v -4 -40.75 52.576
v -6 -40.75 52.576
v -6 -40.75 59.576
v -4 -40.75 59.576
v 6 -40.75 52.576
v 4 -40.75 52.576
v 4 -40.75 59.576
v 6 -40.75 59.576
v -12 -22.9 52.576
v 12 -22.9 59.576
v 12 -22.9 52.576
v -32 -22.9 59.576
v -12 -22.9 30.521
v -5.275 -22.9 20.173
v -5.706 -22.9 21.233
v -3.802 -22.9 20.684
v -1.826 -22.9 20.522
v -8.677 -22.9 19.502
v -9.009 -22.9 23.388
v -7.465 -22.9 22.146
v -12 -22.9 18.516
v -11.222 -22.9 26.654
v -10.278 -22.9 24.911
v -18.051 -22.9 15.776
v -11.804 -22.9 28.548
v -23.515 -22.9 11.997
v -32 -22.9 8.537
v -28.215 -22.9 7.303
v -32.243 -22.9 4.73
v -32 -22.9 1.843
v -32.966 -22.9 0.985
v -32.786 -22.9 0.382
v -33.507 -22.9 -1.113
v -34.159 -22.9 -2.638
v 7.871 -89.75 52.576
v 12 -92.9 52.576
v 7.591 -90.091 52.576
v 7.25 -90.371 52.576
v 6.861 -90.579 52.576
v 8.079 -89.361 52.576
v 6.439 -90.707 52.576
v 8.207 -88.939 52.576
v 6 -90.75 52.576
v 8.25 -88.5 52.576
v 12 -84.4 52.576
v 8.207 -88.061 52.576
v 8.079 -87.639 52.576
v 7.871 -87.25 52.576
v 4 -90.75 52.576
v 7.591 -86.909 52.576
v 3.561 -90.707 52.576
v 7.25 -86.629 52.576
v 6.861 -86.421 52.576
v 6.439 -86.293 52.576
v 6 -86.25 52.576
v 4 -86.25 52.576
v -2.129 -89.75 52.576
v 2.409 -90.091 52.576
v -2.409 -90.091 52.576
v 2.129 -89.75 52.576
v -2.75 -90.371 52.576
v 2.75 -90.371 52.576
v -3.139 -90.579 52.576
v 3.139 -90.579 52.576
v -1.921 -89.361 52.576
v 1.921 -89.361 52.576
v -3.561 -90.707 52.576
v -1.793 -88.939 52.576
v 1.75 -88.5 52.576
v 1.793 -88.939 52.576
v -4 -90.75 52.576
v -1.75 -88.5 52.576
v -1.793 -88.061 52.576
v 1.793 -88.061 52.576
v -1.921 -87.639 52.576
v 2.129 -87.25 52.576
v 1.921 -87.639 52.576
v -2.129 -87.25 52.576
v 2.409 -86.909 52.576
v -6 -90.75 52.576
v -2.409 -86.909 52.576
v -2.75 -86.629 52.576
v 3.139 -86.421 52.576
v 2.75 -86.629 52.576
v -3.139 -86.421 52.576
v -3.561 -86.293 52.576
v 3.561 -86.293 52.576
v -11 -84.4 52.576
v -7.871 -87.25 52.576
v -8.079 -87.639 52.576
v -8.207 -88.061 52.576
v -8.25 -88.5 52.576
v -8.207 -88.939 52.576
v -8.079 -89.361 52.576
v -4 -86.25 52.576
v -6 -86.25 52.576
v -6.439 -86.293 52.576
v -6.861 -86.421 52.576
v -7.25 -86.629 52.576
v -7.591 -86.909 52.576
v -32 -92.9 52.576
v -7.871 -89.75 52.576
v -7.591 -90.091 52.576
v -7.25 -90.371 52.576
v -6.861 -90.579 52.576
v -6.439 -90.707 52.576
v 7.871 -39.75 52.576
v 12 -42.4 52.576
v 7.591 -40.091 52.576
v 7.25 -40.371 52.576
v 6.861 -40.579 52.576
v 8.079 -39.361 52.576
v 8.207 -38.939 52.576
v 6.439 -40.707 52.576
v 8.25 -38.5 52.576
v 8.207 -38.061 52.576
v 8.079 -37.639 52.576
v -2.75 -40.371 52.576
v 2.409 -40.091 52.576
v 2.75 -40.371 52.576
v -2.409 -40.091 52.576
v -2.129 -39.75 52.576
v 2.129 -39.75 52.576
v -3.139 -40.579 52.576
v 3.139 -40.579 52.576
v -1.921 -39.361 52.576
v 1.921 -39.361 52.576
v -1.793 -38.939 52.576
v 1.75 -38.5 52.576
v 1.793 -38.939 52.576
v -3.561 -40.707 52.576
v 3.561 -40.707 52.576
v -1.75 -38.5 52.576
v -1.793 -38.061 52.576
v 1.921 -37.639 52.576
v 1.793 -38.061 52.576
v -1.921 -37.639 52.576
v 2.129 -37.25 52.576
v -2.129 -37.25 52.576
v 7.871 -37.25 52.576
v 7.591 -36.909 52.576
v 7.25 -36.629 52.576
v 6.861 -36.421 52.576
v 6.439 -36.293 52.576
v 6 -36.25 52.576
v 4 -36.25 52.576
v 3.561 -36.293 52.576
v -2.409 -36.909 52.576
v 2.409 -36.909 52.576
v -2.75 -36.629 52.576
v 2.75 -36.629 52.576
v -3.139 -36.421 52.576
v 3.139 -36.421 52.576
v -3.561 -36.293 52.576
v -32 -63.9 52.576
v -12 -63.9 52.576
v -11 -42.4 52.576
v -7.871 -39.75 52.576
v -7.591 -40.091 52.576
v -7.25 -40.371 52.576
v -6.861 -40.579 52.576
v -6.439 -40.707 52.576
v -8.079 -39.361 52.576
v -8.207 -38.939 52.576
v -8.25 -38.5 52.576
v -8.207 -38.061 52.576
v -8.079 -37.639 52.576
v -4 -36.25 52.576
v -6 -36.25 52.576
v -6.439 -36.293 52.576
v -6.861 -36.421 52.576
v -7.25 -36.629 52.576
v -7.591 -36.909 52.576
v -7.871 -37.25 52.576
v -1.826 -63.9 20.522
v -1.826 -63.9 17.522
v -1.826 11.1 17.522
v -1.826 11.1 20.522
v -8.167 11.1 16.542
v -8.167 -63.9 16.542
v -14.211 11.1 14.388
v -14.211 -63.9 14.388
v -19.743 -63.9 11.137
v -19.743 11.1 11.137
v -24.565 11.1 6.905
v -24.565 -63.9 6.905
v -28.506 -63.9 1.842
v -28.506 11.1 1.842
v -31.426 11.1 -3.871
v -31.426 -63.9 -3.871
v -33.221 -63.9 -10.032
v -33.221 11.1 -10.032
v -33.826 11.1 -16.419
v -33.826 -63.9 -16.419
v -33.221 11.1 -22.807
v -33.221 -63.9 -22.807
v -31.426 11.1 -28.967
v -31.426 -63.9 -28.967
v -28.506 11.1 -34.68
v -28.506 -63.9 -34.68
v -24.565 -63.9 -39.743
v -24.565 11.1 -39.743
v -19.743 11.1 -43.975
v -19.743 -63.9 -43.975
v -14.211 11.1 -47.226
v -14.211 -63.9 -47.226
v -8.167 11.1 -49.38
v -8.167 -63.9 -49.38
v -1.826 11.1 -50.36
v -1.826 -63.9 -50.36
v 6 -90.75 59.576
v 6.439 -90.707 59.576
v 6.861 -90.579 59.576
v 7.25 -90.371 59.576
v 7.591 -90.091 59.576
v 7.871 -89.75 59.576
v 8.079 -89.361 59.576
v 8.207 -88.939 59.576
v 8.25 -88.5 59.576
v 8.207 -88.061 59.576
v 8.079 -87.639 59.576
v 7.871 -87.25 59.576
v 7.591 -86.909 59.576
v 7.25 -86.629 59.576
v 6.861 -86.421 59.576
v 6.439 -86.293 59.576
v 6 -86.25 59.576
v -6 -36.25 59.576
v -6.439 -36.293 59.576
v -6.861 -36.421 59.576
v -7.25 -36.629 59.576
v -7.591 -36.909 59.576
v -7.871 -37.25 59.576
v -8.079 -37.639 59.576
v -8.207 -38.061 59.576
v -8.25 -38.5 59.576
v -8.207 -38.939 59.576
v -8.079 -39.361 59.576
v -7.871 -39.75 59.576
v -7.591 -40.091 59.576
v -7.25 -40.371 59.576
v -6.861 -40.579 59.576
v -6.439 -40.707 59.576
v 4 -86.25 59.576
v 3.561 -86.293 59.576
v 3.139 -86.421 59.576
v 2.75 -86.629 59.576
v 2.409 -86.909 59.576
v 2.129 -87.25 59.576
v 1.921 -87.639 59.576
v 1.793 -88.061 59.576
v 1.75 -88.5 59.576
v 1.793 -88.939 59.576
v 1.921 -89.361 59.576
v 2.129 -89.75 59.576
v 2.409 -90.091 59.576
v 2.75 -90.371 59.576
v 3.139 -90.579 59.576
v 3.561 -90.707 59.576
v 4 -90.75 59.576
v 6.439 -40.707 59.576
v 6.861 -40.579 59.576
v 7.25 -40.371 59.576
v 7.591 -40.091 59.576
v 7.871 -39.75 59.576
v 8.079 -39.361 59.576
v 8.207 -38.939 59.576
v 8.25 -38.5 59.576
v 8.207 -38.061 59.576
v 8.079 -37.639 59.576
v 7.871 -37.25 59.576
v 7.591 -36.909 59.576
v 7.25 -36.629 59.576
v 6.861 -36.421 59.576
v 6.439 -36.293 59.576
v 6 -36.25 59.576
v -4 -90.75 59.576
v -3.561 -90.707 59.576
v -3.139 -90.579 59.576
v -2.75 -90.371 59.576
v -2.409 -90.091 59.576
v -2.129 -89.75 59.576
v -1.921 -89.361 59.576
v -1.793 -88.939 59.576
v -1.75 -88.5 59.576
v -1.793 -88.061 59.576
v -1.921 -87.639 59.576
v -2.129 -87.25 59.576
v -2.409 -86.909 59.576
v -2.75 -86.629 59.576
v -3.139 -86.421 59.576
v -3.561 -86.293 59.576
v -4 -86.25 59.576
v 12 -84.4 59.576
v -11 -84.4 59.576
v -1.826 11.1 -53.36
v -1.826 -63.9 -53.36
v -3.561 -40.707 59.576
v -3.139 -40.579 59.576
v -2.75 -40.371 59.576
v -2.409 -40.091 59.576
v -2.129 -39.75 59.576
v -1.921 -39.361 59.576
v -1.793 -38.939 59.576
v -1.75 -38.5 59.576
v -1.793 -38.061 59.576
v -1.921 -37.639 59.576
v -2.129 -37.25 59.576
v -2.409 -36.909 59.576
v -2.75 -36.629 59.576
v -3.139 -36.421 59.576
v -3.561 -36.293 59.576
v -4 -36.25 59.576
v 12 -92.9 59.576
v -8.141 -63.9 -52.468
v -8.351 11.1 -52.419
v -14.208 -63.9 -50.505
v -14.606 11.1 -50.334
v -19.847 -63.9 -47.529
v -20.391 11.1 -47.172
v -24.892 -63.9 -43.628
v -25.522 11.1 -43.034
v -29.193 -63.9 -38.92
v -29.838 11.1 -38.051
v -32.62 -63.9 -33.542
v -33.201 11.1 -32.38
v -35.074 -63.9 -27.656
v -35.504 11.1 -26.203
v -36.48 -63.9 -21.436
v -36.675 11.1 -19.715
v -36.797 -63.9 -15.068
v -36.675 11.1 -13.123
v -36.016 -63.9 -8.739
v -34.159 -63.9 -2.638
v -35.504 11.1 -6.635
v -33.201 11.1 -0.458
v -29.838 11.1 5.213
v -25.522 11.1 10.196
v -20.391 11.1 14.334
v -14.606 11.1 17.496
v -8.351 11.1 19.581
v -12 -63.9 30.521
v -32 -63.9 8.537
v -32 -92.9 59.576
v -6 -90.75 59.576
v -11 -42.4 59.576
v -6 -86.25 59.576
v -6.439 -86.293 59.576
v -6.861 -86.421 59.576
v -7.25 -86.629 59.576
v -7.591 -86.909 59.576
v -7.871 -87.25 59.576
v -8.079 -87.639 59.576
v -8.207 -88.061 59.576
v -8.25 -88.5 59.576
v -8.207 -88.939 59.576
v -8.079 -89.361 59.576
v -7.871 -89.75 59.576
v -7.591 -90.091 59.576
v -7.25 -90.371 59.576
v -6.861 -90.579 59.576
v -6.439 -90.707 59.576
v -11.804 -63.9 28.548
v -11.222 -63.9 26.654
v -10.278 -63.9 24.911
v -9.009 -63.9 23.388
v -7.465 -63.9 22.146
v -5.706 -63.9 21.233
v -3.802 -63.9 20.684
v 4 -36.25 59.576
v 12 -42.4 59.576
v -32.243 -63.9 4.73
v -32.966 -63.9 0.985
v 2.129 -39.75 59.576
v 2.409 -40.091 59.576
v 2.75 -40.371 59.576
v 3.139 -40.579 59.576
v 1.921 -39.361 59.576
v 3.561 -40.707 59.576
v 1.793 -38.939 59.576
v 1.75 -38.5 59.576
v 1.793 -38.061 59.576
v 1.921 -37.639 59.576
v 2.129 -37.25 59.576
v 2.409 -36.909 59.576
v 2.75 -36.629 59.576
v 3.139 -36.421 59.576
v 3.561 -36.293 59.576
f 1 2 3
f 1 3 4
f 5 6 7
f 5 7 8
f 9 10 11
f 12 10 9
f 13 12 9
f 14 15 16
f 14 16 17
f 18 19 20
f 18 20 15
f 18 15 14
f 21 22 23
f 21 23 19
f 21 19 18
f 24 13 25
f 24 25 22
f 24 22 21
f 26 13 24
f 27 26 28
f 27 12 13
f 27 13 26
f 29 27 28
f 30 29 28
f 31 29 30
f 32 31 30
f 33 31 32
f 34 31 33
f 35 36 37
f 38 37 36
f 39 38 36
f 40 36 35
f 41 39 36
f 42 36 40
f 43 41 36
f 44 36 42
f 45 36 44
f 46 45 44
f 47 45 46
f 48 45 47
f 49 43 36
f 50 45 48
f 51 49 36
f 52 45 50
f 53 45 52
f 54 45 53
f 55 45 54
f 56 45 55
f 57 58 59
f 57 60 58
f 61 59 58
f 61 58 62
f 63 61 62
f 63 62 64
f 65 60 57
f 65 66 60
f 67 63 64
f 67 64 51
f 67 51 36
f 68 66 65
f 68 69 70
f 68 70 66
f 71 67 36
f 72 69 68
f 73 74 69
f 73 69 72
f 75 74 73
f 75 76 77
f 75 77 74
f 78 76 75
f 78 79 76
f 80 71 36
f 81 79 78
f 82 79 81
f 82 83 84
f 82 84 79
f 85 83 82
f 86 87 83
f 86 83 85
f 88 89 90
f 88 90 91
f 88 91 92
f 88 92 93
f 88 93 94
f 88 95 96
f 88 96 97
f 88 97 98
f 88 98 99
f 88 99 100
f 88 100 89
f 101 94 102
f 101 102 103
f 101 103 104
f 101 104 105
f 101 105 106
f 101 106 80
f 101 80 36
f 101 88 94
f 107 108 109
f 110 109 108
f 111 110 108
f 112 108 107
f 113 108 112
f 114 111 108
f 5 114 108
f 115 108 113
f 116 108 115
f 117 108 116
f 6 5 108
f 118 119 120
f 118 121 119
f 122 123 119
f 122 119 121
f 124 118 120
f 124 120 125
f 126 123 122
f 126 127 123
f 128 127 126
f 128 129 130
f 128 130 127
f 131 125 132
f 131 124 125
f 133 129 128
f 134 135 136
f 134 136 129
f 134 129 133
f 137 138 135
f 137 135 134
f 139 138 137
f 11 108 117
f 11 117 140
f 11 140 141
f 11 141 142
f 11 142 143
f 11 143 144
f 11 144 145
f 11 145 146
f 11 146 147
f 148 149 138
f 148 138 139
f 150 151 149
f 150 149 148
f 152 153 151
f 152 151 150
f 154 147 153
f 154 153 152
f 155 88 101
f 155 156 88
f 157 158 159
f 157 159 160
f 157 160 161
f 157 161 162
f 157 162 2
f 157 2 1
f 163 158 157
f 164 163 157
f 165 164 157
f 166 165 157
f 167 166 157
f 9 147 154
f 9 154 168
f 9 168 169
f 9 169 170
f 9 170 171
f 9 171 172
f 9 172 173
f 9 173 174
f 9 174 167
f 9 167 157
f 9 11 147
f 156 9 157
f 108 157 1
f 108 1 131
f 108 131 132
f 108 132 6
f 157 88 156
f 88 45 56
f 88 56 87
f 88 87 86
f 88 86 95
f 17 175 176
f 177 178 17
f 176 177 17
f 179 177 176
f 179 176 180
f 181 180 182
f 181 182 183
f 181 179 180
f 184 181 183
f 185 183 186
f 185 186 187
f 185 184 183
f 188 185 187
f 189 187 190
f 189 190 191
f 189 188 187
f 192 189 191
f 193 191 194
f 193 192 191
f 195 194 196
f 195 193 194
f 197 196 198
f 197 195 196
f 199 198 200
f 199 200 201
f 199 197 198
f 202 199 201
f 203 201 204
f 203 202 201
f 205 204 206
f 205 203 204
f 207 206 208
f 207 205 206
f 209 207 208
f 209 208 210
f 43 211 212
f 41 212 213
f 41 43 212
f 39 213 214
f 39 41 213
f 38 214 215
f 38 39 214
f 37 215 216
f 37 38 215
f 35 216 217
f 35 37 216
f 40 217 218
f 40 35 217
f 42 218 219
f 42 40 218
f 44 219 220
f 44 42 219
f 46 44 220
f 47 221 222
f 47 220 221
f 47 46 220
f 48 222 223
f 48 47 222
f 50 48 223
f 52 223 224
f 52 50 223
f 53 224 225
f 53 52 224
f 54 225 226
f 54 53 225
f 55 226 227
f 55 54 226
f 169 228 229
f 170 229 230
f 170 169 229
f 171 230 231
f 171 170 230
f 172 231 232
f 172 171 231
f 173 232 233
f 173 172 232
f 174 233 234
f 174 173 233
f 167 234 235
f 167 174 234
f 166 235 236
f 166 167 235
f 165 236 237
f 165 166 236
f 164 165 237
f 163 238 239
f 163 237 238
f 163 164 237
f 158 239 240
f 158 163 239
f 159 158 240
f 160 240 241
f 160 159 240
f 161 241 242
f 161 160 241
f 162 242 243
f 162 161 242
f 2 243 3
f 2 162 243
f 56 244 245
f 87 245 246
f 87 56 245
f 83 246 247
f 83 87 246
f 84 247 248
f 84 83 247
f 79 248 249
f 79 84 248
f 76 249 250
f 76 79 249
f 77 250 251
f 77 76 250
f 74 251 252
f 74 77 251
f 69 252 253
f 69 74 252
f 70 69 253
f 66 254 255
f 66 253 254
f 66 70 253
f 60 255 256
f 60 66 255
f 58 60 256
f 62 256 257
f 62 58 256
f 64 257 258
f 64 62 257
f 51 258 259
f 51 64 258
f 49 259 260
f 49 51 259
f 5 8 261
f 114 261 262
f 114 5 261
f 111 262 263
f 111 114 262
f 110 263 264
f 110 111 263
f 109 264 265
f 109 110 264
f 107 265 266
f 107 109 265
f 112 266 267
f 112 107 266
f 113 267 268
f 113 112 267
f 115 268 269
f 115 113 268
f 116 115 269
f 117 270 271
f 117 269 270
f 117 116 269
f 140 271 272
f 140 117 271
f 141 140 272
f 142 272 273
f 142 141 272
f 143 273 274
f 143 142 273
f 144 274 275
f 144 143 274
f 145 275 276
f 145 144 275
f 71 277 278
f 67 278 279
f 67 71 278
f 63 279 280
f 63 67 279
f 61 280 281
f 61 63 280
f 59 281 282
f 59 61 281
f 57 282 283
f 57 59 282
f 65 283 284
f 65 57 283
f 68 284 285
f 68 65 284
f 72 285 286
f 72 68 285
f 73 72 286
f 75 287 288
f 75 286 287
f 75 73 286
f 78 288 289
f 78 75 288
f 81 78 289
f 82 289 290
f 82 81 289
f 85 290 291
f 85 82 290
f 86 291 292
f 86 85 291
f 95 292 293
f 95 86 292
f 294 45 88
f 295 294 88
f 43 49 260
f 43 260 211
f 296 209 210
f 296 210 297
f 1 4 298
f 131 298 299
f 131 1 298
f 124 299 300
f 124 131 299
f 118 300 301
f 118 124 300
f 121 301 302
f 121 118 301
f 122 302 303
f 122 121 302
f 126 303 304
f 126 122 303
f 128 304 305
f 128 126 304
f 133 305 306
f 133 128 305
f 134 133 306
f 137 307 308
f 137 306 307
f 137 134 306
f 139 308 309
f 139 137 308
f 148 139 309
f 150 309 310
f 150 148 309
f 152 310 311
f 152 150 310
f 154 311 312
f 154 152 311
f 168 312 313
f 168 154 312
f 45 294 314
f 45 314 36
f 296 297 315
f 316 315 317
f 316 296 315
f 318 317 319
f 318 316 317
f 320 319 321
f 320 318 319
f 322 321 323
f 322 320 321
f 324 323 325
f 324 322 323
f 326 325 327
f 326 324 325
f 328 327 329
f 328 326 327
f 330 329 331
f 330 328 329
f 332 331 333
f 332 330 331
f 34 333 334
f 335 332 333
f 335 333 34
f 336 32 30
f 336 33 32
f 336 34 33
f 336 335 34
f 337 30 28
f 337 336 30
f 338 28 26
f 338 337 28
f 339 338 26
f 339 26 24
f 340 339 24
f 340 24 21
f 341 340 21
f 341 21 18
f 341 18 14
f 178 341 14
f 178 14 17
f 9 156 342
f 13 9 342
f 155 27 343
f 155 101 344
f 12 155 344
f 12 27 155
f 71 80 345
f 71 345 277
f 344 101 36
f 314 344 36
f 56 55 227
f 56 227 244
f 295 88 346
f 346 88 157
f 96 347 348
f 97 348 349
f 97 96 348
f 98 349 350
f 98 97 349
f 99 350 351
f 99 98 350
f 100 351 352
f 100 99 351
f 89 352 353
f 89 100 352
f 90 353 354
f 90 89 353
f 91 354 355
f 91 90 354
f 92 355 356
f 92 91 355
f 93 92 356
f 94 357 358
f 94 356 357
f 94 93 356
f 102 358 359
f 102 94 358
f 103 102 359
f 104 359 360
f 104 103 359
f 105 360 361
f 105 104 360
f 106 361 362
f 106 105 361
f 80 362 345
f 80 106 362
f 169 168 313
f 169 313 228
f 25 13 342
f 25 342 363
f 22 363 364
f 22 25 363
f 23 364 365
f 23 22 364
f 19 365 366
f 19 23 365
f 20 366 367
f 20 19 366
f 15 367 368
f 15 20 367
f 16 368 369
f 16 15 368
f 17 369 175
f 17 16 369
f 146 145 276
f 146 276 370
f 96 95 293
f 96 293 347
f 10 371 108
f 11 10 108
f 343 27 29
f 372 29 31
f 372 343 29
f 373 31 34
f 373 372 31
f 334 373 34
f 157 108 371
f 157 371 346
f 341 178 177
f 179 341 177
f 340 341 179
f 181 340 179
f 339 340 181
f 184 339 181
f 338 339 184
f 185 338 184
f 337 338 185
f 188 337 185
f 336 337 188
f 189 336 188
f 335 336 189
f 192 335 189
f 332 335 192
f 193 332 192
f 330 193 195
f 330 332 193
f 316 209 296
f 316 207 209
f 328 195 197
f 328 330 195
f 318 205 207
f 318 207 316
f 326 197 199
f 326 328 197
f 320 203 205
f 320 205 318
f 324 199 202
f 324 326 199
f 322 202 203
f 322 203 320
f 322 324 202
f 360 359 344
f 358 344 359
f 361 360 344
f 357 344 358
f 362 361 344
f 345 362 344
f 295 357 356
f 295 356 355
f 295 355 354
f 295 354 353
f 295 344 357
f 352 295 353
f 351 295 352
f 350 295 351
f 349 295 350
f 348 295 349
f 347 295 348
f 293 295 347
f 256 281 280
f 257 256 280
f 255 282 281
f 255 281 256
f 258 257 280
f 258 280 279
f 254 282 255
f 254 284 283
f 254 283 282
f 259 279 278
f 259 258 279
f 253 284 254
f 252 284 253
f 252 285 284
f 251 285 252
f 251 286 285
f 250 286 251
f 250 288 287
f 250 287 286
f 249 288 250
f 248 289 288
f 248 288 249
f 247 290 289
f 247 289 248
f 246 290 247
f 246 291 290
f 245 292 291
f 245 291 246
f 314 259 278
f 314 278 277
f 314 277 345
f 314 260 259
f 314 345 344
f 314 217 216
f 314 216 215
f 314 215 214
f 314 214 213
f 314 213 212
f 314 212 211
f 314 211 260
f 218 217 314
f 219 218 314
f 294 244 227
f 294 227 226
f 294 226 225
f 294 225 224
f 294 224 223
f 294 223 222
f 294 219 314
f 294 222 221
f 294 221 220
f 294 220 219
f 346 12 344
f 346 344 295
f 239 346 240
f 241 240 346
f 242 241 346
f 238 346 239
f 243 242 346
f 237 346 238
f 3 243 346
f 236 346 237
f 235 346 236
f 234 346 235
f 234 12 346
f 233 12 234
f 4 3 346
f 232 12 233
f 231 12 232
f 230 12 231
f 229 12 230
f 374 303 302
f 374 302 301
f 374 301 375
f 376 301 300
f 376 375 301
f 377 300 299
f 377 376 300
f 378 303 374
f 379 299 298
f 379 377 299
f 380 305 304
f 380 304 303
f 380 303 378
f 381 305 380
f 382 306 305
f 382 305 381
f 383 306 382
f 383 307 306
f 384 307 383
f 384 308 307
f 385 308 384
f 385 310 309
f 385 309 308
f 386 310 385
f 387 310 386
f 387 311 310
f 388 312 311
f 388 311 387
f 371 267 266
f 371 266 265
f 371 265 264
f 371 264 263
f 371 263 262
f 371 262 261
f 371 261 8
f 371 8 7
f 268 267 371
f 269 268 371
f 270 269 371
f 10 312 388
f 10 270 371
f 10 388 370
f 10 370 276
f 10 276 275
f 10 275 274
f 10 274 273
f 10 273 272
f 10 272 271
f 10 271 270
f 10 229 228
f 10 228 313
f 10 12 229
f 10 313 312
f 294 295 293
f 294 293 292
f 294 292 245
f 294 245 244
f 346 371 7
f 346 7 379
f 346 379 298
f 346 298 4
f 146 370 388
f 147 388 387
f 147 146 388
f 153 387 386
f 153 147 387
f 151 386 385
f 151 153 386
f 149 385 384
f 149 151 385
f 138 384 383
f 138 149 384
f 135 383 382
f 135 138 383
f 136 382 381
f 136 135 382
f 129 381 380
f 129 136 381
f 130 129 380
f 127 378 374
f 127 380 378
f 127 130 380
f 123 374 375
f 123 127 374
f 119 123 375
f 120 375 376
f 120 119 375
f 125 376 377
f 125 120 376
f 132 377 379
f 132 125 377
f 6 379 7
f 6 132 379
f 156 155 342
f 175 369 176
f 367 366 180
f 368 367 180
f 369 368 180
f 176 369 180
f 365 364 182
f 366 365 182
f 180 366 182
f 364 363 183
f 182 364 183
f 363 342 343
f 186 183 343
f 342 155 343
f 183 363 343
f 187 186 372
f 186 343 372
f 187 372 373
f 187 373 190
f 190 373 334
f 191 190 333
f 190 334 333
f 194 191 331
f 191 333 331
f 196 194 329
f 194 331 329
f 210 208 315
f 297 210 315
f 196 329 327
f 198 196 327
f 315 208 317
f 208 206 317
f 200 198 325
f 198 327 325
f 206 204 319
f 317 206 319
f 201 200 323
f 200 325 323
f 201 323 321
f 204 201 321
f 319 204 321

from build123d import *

# Parameters (mm, degrees)
BOSS_EXTRU_1_DEPTH      = 75
BOSS_EXTRU_2_START      = -70
BOSS_EXTRU_2_DEPTH      = 70
ENL_V_START             = -29
ENL_V_MAT_EXTRU_1_DEPTH = 29
CONG_1_R                = 30
CONG_2_R                = 10
ESQUISSE5_W             = 23
ESQUISSE5_H             = 42
ENL_V_MAT_EXTRU_2_DEPTH = 146.632261285


with BuildPart() as part:
    # Esquisse1 → Boss.-Extru.1 (new body)
    with BuildSketch(Plane(origin=(0, 11.1, 0), x_dir=(0, 0, 1), z_dir=(0, -1, 0))):
        with BuildLine():
            Line((-50.360184389, 1.826437931), (-53.360184389, 1.826437931))
            ThreePointArc((-53.360184389, 1.826437931), (-16.419058892, 36.821664014), (20.522066605, 1.826437931))
            Line((20.522066605, 1.826437931), (17.522066605, 1.826437931))
            ThreePointArc((17.522066605, 1.826437931), (-16.419058892, 33.826437931), (-50.360184389, 1.826437931))
        make_face()
    extrude(amount=BOSS_EXTRU_1_DEPTH)

    # Esquisse3 → Boss.-Extru.2 (add)
    with BuildSketch(Plane(origin=(0, -92.9, 0), x_dir=(-1, 0, 0), z_dir=(0, -1, 0)).offset(BOSS_EXTRU_2_START)):
        with BuildLine():
            Line((32, -1.84316049), (32, -59.576167192))
            Line((32, -59.576167192), (-12, -59.576167192))
            Line((-12, -59.576167192), (-12, -52.576167192))
            Line((-12, -52.576167192), (12, -52.576167192))
            Line((12, -52.576167192), (12, -18.515896948))
            ThreePointArc((12, -18.515896948), (23.515293751, -11.997219241), (32, -1.84316049))
        make_face()
    extrude(amount=BOSS_EXTRU_2_DEPTH)

    # Esquisse4 → Enlèv. mat.-Extru.1 (cut)
    with BuildSketch(Plane.XZ.offset(92.9).offset(ENL_V_START)):
        with BuildLine():
            Line((-12, 18.515896948), (-12, 52.576167192))
            Line((-12, 52.576167192), (-32, 52.576167192))
            Line((-32, 52.576167192), (-32, 1.84316049))
            ThreePointArc((-32, 1.84316049), (-23.515293751, 11.997219241), (-12, 18.515896948))
        make_face()
    extrude(amount=ENL_V_MAT_EXTRU_1_DEPTH, mode=Mode.SUBTRACT)

    # Congé1
    cong_1_edges = [part.edges().sort_by_distance(p)[0] for p in [
        (-32, -43.4, 1.84316049),
    ]]
    fillet(cong_1_edges, radius=CONG_1_R)

    # Congé2
    # the kernel refuses this fillet: 10 mm, written as the material it adds along each edge
    with BuildSketch(Plane(origin=(-12, -22.9, 18.515896948), x_dir=(0, 0, 1), z_dir=(0, -1, 0))) as cong_2_piece_1_section:
        with BuildLine():
            CenterArc((12.004663354, -10), CONG_2_R, 90, 90.994487339)
            Line((2.006169657, -10.173562069), (1.806199783, -10.177033311))
            ThreePointArc((1.806199783, -10.177033311), (1.165077614, -5.054836961), (-0.188861967, -0.06581153))
            Line((-0.188861967, -0.06581153), (0, 0.2))
            Line((0, 0.2), (12.004663354, 0.2))
            Line((12.004663354, 0.2), (12.004663354, 0))
        make_face()
    cong_2_piece_1 = extrude(amount=41, mode=Mode.PRIVATE)
    cong_2_piece_1 = split(cong_2_piece_1, bisect_by=Plane(origin=(-1.826437931, -43.4, 22.039675227), z_dir=(-1, 0, 0)), keep=Keep.TOP, mode=Mode.PRIVATE)
    add(cong_2_piece_1)

    # Esquisse5 → Enlèv. mat.-Extru.2 (cut, through all)
    with BuildSketch(Plane(origin=(0, 0, 52.576167192), x_dir=(-1, 0, 0), z_dir=(0, 0, -1))):
        with Locations((-0.5, -63.4)):
            Rectangle(ESQUISSE5_W, ESQUISSE5_H)
        with BuildLine():
            Line((-6, -36.25), (-4, -36.25))
            ThreePointArc((-4, -36.25), (-1.75, -38.5), (-4, -40.75))
            Line((-4, -40.75), (-6, -40.75))
            ThreePointArc((-6, -40.75), (-8.25, -38.5), (-6, -36.25))
        make_face()
        with BuildLine():
            Line((4, -36.25), (6, -36.25))
            ThreePointArc((6, -36.25), (8.25, -38.5), (6, -40.75))
            Line((6, -40.75), (4, -40.75))
            ThreePointArc((4, -40.75), (1.75, -38.5), (4, -36.25))
        make_face()
        with BuildLine():
            Line((-6, -86.25), (-4, -86.25))
            ThreePointArc((-4, -86.25), (-1.75, -88.5), (-4, -90.75))
            Line((-4, -90.75), (-6, -90.75))
            ThreePointArc((-6, -90.75), (-8.25, -88.5), (-6, -86.25))
        make_face()
        with BuildLine():
            Line((4, -86.25), (6, -86.25))
            ThreePointArc((6, -86.25), (8.25, -88.5), (6, -90.75))
            Line((6, -90.75), (4, -90.75))
            ThreePointArc((4, -90.75), (1.75, -88.5), (4, -86.25))
        make_face()
    extrude(amount=-ENL_V_MAT_EXTRU_2_DEPTH, mode=Mode.SUBTRACT)


solid = part.part
